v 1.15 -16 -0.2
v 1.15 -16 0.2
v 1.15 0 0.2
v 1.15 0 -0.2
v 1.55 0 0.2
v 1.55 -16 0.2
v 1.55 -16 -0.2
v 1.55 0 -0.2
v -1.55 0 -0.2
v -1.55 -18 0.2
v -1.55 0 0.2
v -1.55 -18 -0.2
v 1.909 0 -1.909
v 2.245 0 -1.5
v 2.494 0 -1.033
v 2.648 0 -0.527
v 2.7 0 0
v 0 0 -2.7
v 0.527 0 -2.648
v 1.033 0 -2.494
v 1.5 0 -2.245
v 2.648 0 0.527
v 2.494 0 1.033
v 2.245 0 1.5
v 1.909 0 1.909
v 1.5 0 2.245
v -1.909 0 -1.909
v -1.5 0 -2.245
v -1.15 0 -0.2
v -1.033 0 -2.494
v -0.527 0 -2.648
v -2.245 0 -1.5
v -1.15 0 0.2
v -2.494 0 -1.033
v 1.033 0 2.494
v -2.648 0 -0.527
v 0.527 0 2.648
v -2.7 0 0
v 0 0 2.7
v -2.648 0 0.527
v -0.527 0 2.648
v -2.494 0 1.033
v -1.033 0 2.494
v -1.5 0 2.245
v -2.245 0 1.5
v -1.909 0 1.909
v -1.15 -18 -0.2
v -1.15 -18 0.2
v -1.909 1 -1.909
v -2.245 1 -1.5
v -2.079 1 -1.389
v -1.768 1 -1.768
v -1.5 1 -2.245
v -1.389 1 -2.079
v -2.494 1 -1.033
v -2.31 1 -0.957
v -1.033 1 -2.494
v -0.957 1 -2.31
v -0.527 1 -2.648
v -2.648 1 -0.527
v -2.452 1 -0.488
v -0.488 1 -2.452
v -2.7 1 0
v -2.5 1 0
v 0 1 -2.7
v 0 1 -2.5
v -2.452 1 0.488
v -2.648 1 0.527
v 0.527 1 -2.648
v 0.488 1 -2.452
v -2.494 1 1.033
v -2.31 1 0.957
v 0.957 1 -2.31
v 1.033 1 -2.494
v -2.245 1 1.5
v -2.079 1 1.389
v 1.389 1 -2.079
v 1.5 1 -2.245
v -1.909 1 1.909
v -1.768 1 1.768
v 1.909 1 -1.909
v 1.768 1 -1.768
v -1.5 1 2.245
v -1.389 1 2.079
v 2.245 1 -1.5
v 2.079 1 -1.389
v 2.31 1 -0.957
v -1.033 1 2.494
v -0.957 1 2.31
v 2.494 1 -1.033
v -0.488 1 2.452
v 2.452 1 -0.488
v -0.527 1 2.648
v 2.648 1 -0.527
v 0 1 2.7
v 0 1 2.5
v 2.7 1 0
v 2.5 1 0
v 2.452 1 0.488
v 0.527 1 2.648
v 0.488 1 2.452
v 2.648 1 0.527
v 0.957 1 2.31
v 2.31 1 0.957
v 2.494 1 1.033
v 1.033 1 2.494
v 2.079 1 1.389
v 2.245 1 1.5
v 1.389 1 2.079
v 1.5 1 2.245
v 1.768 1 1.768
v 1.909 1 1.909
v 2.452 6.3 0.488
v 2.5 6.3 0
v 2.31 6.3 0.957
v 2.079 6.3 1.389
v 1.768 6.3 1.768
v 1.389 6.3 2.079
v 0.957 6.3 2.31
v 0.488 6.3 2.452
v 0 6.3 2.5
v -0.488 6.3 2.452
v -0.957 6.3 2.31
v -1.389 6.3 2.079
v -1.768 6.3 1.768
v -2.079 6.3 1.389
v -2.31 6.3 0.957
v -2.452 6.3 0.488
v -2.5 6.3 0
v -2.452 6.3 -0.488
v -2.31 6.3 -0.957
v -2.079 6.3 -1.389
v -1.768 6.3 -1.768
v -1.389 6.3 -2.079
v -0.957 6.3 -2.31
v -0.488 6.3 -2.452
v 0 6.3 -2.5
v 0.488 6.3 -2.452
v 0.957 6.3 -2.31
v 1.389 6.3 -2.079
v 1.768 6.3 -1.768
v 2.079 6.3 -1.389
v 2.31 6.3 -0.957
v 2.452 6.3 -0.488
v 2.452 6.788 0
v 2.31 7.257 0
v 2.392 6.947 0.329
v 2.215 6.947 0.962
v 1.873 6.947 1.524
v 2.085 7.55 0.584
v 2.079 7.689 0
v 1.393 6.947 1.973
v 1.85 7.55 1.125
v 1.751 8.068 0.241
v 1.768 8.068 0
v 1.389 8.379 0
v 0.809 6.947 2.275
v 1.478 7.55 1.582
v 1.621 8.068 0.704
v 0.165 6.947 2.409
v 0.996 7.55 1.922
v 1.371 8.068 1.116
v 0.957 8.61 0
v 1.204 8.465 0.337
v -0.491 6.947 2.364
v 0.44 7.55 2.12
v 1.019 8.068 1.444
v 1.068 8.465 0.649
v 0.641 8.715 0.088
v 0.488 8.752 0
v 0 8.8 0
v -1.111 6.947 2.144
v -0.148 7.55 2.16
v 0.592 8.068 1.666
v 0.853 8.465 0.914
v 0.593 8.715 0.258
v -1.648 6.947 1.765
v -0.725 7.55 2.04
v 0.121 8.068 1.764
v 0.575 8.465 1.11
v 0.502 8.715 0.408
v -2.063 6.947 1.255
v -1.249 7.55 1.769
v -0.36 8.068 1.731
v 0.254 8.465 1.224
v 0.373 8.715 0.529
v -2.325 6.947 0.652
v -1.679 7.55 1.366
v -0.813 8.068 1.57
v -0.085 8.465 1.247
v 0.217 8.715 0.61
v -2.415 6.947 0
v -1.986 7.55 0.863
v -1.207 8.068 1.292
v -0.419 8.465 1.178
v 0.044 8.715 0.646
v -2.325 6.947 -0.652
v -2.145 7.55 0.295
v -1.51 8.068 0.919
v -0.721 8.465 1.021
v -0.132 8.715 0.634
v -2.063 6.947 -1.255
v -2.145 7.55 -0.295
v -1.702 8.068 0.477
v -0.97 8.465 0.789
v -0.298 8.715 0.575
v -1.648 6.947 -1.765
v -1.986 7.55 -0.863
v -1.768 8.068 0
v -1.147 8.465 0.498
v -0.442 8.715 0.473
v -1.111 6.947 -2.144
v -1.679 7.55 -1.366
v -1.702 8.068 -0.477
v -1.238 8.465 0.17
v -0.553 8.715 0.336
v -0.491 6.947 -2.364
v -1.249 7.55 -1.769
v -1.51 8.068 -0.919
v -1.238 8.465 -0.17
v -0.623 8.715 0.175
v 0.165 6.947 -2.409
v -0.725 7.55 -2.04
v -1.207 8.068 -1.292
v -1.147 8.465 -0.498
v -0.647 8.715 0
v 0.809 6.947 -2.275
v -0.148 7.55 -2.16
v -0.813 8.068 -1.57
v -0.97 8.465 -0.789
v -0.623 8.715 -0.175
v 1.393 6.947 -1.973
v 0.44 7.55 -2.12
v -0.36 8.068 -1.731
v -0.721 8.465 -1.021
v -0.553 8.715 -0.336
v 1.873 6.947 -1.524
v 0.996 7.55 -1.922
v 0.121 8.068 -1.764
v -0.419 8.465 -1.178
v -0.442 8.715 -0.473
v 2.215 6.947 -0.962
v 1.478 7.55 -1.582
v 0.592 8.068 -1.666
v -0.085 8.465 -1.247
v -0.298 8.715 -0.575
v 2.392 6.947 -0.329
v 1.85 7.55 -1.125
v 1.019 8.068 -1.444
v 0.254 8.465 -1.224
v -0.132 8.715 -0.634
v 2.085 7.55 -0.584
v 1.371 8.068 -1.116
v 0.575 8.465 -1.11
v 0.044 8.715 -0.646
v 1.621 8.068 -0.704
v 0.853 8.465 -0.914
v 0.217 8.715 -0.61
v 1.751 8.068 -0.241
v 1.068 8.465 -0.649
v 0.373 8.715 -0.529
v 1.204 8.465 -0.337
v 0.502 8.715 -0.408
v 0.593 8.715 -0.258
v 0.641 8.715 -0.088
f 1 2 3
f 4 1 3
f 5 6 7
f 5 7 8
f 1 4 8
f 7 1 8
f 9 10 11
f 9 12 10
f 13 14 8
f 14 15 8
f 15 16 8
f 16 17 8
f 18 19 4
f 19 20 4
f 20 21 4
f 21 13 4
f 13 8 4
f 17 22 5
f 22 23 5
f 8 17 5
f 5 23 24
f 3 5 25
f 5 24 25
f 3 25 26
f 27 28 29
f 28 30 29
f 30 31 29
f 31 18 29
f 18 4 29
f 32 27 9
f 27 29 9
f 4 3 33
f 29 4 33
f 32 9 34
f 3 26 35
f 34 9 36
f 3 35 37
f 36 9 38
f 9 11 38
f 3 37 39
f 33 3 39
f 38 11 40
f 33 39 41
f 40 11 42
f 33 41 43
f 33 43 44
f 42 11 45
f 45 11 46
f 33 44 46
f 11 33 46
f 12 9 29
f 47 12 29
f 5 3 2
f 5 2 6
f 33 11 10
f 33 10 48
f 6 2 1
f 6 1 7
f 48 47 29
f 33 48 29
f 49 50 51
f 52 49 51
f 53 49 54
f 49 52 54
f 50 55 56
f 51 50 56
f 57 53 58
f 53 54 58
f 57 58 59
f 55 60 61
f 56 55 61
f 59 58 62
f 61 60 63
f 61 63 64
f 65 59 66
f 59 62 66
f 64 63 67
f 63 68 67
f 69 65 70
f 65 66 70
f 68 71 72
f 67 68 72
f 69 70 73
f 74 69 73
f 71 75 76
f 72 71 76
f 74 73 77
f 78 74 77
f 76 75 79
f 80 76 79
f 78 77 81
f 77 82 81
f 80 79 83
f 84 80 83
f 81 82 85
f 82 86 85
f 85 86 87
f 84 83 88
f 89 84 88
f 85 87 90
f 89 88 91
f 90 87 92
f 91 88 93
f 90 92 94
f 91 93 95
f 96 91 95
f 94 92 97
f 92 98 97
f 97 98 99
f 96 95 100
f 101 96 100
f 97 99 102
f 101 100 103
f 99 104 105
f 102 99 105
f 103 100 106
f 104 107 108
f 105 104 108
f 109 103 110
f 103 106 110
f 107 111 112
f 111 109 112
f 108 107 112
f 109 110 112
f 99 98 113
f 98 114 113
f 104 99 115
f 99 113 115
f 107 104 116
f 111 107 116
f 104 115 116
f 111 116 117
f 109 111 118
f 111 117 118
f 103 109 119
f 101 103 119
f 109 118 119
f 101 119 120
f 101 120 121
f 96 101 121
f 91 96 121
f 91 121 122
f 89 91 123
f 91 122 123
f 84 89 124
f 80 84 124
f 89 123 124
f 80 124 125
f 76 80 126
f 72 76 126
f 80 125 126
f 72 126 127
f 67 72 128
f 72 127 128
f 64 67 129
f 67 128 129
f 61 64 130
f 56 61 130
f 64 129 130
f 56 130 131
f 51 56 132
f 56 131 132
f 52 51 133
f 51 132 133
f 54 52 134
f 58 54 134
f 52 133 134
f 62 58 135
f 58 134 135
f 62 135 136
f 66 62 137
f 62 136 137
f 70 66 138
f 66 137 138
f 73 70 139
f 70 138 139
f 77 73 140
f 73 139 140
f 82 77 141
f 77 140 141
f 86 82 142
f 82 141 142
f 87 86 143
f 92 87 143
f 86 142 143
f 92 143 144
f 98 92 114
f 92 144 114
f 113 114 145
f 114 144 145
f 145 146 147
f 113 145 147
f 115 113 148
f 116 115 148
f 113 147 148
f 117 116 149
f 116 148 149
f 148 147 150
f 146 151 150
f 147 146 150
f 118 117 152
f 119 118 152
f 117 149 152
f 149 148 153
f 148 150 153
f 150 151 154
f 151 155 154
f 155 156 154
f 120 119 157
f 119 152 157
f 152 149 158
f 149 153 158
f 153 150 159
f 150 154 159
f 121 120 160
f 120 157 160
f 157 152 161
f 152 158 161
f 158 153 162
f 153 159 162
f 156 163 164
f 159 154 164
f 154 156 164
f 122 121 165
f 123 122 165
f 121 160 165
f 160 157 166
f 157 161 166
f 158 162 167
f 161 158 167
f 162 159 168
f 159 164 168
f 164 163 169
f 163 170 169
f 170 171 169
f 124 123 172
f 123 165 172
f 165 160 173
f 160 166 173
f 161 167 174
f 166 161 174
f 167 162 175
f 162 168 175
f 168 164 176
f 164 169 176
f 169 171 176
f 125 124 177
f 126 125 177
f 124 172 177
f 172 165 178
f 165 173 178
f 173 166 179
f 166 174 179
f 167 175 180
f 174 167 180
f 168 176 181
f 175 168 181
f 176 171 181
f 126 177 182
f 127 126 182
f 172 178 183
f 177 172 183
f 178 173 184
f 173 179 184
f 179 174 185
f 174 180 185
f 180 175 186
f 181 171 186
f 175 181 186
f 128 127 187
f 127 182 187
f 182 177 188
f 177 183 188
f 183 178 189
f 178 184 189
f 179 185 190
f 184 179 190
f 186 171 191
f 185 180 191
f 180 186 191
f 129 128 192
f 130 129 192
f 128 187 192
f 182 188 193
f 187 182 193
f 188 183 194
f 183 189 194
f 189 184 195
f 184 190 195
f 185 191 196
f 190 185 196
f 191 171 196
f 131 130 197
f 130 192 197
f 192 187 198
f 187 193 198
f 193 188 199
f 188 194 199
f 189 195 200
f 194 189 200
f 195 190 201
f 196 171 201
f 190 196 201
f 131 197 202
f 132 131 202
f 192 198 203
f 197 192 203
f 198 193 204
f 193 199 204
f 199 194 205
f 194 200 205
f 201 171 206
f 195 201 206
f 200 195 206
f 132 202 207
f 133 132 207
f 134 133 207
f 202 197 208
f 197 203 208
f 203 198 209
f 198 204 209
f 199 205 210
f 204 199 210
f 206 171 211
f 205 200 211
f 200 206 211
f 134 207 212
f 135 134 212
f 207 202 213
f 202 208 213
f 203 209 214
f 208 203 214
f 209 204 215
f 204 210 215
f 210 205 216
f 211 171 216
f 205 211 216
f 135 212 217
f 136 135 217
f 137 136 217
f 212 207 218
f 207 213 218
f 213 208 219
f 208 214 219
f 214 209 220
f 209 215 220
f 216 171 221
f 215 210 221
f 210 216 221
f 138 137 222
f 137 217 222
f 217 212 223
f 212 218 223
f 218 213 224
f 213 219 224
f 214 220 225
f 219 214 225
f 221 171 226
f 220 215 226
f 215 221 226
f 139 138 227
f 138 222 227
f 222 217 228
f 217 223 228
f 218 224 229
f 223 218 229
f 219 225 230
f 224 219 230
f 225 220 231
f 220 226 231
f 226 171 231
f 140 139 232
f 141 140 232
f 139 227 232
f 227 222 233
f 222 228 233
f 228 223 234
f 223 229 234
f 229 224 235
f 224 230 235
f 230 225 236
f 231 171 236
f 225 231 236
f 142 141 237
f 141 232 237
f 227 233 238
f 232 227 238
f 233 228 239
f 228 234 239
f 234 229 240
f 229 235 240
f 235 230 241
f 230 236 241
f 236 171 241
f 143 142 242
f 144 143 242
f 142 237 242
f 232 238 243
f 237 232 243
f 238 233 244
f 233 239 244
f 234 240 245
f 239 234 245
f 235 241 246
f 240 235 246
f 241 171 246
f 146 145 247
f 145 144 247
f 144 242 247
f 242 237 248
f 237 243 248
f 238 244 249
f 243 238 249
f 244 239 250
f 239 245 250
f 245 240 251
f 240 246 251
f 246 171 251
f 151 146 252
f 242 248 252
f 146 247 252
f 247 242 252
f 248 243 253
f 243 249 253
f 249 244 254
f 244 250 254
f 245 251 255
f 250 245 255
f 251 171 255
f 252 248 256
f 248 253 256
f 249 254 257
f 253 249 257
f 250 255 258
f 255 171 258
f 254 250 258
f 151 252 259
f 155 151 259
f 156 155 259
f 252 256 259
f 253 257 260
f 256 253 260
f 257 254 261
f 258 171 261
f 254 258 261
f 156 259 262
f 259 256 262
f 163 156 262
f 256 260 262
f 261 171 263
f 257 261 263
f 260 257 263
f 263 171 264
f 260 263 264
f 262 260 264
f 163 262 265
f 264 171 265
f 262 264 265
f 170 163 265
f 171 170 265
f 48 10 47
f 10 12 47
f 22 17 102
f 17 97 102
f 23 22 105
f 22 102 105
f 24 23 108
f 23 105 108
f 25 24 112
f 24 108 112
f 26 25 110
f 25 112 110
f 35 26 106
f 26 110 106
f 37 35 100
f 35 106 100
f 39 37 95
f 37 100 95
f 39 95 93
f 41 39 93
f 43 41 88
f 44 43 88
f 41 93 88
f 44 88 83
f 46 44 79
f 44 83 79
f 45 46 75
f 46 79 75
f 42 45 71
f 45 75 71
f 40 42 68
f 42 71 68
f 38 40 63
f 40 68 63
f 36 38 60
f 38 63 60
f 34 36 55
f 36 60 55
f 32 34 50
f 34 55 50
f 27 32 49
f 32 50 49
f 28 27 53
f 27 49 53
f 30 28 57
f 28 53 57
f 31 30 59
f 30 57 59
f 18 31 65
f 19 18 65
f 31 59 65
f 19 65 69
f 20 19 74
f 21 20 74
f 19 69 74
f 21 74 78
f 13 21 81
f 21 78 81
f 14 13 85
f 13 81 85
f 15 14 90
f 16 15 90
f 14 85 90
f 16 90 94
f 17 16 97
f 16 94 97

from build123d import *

# Parameters (mm, degrees)
BOSS_EXTRUDE1_DEPTH      = 0.2
BOSS_EXTRUDE1_DEPTH_BACK = 0.2
SKETCH2_W                = 0.4
SKETCH2_H                = 16
SKETCH2_H_2              = 18


with BuildPart() as part:
    # Sketch1 → Revolve1 (revolve)
    with BuildSketch(Plane.XY):
        with BuildLine():
            Line((0, 0), (2.7, 0))
            Line((2.7, 0), (2.7, 1))
            Line((2.7, 1), (2.5, 1))
            Line((2.5, 1), (2.5, 6.3))
            ThreePointArc((2.5, 6.3), (1.767766953, 8.067766953), (0, 8.8))
            Line((0, 8.8), (0, 0))
        make_face()
    revolve(axis=Axis((0, 8.8, 0), (0, -1, 0)))

    # Sketch2 → Boss-Extrude1 (add, two sides: drawn at the far end of the back side and taken through both)
    with BuildSketch(Plane.XY.offset(-BOSS_EXTRUDE1_DEPTH_BACK)):
        with Locations((1.35, -8)):
            Rectangle(SKETCH2_W, SKETCH2_H)
        with Locations((-1.35, -9)):
            Rectangle(SKETCH2_W, SKETCH2_H_2)
    extrude(amount=BOSS_EXTRUDE1_DEPTH + BOSS_EXTRUDE1_DEPTH_BACK)


solid = part.part
